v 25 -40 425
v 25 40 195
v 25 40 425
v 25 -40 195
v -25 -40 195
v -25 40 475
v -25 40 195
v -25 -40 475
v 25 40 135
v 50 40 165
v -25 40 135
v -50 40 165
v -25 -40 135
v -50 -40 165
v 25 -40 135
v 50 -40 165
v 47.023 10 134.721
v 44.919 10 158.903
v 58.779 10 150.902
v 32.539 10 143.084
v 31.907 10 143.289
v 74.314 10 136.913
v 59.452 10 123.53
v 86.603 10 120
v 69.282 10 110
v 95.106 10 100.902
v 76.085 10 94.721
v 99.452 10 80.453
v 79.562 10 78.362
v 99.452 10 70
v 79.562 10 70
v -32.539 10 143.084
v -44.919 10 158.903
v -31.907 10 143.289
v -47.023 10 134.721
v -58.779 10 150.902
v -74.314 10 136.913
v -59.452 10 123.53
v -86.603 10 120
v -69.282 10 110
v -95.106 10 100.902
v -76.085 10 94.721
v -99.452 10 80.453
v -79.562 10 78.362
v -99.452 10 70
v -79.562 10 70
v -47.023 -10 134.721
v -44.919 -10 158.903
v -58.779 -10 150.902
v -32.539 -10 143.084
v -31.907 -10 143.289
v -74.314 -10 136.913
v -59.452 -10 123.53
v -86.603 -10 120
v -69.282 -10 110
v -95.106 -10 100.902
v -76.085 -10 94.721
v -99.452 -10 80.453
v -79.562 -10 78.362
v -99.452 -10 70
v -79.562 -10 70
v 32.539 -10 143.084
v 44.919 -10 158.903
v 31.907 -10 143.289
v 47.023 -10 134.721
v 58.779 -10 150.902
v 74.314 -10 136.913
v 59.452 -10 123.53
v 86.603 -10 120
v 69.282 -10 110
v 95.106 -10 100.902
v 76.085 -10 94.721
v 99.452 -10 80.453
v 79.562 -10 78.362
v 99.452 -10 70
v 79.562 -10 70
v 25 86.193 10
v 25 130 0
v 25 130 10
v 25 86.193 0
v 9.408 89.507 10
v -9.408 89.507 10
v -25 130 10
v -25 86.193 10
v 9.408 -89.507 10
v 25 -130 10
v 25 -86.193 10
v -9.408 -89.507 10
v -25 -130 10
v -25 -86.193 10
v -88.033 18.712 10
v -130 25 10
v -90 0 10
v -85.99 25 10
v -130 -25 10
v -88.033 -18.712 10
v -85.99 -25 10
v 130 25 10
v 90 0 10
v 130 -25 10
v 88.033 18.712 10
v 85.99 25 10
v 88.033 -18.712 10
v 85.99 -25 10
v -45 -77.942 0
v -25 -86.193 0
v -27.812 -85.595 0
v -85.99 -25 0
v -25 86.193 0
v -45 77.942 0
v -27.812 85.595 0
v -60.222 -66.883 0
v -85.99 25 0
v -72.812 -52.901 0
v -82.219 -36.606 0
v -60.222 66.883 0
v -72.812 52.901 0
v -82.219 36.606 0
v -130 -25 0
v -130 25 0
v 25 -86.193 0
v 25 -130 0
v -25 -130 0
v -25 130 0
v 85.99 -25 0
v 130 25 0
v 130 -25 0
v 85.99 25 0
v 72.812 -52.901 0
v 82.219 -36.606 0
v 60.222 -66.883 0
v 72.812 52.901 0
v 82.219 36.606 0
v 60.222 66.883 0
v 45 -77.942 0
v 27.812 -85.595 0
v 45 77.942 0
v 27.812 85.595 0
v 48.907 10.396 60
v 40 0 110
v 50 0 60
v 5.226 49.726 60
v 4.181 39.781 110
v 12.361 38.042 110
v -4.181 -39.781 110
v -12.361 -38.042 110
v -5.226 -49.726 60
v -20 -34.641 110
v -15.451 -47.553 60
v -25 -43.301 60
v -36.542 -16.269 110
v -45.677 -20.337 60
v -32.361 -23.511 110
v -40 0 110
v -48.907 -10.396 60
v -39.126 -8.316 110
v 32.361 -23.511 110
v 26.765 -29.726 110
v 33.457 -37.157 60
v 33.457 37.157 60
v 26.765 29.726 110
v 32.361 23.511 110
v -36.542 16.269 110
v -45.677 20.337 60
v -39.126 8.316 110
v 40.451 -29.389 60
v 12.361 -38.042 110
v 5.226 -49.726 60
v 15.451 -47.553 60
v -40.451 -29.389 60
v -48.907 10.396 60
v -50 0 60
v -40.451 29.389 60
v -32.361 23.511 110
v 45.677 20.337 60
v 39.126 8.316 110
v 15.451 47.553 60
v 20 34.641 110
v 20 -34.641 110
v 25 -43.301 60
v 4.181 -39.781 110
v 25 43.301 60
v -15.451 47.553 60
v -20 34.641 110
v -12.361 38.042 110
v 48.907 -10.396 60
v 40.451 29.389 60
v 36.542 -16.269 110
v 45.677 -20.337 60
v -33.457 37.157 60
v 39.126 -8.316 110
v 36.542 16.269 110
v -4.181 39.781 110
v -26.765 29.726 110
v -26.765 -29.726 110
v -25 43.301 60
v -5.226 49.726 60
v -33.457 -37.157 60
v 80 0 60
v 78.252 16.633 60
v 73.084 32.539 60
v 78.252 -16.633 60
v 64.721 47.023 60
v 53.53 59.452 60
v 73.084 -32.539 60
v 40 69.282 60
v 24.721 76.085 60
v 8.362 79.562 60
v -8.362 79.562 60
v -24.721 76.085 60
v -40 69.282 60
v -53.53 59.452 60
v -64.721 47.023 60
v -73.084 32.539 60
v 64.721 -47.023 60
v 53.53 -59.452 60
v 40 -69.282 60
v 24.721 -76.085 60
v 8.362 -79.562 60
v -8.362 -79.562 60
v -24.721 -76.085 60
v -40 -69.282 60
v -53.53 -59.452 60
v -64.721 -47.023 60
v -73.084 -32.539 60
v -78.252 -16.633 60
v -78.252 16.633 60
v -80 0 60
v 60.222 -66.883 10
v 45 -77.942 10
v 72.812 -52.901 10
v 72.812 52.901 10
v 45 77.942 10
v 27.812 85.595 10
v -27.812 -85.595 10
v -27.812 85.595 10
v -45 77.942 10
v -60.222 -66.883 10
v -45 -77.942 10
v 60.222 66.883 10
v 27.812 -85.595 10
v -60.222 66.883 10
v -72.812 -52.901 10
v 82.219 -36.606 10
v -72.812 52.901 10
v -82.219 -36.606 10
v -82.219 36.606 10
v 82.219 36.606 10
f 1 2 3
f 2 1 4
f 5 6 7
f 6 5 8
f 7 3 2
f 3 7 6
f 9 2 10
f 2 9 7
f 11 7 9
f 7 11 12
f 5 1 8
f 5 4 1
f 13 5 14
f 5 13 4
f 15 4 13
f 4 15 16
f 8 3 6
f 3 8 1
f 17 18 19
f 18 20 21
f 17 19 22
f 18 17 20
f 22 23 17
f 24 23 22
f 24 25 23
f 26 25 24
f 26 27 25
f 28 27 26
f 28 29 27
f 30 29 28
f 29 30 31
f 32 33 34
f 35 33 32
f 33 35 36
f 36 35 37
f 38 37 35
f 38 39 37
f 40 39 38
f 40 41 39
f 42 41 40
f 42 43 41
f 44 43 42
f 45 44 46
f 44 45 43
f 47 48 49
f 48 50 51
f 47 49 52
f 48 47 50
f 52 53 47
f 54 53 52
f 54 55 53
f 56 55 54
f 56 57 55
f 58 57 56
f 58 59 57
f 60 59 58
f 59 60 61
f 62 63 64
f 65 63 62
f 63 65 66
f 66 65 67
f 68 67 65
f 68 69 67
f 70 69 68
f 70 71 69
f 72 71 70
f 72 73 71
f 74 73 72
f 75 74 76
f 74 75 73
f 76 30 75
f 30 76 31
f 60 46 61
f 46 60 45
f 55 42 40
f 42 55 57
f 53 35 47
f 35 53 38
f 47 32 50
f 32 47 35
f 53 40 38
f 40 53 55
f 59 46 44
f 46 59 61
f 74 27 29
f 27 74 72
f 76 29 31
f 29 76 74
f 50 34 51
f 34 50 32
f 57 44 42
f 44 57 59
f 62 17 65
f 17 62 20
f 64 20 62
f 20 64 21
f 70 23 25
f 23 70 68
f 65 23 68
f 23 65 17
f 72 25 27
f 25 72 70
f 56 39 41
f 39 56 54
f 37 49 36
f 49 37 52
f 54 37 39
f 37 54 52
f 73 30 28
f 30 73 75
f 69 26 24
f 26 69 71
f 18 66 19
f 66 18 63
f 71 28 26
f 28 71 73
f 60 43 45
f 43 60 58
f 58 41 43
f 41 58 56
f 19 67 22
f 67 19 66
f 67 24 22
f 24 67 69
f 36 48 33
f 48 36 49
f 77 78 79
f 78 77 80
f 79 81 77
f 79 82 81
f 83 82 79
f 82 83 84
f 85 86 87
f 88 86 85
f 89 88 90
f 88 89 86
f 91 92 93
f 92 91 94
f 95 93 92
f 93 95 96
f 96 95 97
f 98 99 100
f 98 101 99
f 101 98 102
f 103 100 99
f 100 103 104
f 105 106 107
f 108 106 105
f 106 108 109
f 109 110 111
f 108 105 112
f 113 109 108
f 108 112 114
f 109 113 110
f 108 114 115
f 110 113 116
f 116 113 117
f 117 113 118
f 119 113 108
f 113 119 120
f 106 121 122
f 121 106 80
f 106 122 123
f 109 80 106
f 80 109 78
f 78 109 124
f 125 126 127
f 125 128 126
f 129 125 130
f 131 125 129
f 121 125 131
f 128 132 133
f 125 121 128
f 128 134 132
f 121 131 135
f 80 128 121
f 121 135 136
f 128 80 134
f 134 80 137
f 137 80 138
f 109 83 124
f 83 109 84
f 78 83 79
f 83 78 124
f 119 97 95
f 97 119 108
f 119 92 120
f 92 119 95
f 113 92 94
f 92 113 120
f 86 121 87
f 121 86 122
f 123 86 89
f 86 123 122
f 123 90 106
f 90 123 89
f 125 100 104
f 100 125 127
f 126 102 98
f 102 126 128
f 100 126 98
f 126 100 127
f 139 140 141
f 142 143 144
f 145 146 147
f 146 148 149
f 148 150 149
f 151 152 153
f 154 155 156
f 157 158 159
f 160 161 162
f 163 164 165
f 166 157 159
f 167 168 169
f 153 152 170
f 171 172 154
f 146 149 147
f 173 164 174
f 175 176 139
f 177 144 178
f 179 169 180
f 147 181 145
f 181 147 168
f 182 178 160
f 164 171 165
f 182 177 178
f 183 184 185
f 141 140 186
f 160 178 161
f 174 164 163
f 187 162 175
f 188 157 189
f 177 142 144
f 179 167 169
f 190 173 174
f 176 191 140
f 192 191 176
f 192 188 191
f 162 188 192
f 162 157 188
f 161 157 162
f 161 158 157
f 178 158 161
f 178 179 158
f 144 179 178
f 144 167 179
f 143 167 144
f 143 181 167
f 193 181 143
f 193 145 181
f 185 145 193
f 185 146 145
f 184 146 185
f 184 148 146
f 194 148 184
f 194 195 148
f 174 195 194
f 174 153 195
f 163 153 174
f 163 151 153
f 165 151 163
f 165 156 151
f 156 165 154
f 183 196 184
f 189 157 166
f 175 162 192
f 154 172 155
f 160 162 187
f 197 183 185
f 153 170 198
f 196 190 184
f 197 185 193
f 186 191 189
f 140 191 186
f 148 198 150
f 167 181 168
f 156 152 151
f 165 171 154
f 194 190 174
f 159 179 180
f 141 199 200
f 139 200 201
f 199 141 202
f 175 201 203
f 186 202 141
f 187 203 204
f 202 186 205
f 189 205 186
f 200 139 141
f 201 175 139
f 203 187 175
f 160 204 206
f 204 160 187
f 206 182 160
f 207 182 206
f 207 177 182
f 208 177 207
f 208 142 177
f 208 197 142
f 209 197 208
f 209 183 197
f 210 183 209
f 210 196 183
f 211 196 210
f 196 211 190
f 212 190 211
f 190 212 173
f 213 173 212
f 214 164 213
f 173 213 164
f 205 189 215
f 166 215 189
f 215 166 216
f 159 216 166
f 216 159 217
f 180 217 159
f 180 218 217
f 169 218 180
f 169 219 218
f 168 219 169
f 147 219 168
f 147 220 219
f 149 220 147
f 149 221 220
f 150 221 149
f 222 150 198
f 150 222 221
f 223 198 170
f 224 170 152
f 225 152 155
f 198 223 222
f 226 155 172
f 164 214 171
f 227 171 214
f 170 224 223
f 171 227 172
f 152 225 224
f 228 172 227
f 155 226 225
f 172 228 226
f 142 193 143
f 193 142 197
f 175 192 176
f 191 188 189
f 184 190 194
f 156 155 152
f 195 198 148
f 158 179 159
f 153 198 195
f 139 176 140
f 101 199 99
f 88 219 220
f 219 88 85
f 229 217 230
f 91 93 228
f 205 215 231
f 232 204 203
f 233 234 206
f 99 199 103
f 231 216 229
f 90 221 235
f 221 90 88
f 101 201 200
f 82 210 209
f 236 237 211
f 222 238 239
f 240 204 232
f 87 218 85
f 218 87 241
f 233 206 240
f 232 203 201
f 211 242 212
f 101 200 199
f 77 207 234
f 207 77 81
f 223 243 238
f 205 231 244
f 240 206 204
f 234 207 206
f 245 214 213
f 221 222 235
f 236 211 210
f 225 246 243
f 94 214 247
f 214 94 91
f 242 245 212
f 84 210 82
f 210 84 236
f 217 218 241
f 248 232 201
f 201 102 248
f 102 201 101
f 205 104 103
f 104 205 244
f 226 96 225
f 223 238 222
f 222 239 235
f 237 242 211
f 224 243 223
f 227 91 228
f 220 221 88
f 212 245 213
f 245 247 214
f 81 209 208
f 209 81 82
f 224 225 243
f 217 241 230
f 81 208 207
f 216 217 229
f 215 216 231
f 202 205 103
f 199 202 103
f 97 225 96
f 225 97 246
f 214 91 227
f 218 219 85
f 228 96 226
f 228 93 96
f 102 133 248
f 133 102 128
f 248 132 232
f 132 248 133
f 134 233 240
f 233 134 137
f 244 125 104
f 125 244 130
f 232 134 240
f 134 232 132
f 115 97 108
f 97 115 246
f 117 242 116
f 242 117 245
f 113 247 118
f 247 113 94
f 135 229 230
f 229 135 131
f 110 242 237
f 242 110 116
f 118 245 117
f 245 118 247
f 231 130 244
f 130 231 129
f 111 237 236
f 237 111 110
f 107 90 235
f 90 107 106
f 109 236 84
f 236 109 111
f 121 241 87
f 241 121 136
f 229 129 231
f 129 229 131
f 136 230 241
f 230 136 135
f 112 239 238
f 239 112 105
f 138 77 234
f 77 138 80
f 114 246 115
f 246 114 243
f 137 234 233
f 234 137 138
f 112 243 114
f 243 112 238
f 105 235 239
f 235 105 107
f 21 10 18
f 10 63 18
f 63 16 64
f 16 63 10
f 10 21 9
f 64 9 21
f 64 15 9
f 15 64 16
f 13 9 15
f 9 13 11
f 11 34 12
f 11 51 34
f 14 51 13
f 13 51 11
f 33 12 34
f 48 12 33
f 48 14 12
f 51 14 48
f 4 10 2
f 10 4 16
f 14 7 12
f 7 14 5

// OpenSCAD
group(){
    difference(){
        translate([-25,-40,195])
        cube([50,80,300],false);
    
        translate([-40,-40,490])
        rotate([0,45,0])
        cube([100,160,50],false);    
    }
}


translate([0,-10,0])
rotate([0,0,90])
group(){
    rotate([0,90,0])
    translate([-70,0,0])
    difference(){
        cylinder(20,100,100);
        group(){
            translate([0,-100,0])
            cube([100,200,20],false);
            cylinder(20,80,80);
        }
    
    }
}
translate([0,0,60])
cylinder(50,50,40);

translate([0,0,10])
cylinder(50,90,80);

cylinder(10,90,90);

for(k =  [0 : 1 : 3]){
    rotate([0,0,90*k])
    translate([-25,80,0])    
    cube([50,50,10],false);
}
B = 100; //-- Base larga
b = 50; //-- Base corta
h = 60; //-- Altura
translate([0,0,150])
rotate([90, 180, 0]) 
linear_extrude(height = 80, center = true) 
polygon(points = [
                  [-B/2, -h/2],
                  [-b/2, h/2],
                  [b/2, h/2],
                  [B/2, -h/2]
                 ]);

B = 100; //-- Base larga
b = 50; //-- Base corta
h = 30; //-- Altura
translate([0,0,180])
rotate([90, 0, 0]) 
linear_extrude(height = 80, center = true) 
polygon(points = [
                  [-B/2, -h/2],
                  [-b/2, h/2],
                  [b/2, h/2],
                  [B/2, -h/2]
                 ]);
